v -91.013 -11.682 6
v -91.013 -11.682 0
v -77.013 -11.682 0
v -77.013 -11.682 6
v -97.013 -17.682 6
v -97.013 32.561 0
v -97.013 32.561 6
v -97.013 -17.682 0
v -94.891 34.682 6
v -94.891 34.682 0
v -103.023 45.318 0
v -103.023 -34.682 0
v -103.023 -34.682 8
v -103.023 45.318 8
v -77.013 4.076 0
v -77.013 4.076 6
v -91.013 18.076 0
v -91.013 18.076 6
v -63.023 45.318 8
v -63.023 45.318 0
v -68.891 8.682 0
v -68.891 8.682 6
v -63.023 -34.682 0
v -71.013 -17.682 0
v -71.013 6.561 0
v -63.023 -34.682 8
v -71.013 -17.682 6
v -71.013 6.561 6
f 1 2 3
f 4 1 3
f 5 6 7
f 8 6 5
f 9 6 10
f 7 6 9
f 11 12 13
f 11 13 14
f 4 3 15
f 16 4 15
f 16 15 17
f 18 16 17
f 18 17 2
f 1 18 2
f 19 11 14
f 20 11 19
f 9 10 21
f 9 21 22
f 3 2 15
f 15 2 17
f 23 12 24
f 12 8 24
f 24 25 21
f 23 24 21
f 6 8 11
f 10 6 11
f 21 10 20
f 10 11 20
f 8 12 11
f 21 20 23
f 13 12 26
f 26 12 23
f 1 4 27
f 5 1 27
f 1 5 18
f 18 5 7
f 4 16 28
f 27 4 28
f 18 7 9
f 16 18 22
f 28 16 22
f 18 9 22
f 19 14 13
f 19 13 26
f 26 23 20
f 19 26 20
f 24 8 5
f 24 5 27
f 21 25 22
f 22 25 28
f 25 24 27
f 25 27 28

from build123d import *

# Parameters (mm, degrees)
SKETCH1_W               = 40
SKETCH1_H               = 80
BOSS_EXTRUDE1_DEPTH     = 8
CUT_EXTRUDE_THIN1_DEPTH = 6
SKETCH2_W               = 6
SKETCH2_H               = 36.769552622
CUT_EXTRUDE1_DEPTH      = 3


with BuildPart() as part:
    # Sketch1 → Boss-Extrude1 (new body)
    with BuildSketch(Plane.XY):
        with Locations((-83.02277118, 5.318441745)):
            Rectangle(SKETCH1_W, SKETCH1_H)
    extrude(amount=BOSS_EXTRUDE1_DEPTH)

    # Sketch1<4> → Cut-Extrude-Thin1 (cut)
    with BuildSketch(Plane.XY):
        Polygon((-97.012604353, 32.561082432), (-97.012604353, -17.681558255), (-71.012604353, -17.681558255), (-71.012604353, 6.561082432), align=None)
        Polygon((-91.012604353, 18.075801058), (-91.012604353, -11.681558255), (-77.012604353, -11.681558255), (-77.012604353, 4.075801058), align=None, mode=Mode.SUBTRACT)
    extrude(amount=CUT_EXTRUDE_THIN1_DEPTH, mode=Mode.SUBTRACT)

    # Sketch2 → Cut-Extrude1 (cut)
    with BuildSketch(Plane(origin=(-32.22576096, -32.22576096, 0), x_dir=(0, 0, 1), z_dir=(-0.7071067811865461, -0.707106781186549, 0))):
        with Locations((3, 73.237656278)):
            Rectangle(SKETCH2_W, SKETCH2_H)
    extrude(amount=-CUT_EXTRUDE1_DEPTH, mode=Mode.SUBTRACT)


solid = part.part
